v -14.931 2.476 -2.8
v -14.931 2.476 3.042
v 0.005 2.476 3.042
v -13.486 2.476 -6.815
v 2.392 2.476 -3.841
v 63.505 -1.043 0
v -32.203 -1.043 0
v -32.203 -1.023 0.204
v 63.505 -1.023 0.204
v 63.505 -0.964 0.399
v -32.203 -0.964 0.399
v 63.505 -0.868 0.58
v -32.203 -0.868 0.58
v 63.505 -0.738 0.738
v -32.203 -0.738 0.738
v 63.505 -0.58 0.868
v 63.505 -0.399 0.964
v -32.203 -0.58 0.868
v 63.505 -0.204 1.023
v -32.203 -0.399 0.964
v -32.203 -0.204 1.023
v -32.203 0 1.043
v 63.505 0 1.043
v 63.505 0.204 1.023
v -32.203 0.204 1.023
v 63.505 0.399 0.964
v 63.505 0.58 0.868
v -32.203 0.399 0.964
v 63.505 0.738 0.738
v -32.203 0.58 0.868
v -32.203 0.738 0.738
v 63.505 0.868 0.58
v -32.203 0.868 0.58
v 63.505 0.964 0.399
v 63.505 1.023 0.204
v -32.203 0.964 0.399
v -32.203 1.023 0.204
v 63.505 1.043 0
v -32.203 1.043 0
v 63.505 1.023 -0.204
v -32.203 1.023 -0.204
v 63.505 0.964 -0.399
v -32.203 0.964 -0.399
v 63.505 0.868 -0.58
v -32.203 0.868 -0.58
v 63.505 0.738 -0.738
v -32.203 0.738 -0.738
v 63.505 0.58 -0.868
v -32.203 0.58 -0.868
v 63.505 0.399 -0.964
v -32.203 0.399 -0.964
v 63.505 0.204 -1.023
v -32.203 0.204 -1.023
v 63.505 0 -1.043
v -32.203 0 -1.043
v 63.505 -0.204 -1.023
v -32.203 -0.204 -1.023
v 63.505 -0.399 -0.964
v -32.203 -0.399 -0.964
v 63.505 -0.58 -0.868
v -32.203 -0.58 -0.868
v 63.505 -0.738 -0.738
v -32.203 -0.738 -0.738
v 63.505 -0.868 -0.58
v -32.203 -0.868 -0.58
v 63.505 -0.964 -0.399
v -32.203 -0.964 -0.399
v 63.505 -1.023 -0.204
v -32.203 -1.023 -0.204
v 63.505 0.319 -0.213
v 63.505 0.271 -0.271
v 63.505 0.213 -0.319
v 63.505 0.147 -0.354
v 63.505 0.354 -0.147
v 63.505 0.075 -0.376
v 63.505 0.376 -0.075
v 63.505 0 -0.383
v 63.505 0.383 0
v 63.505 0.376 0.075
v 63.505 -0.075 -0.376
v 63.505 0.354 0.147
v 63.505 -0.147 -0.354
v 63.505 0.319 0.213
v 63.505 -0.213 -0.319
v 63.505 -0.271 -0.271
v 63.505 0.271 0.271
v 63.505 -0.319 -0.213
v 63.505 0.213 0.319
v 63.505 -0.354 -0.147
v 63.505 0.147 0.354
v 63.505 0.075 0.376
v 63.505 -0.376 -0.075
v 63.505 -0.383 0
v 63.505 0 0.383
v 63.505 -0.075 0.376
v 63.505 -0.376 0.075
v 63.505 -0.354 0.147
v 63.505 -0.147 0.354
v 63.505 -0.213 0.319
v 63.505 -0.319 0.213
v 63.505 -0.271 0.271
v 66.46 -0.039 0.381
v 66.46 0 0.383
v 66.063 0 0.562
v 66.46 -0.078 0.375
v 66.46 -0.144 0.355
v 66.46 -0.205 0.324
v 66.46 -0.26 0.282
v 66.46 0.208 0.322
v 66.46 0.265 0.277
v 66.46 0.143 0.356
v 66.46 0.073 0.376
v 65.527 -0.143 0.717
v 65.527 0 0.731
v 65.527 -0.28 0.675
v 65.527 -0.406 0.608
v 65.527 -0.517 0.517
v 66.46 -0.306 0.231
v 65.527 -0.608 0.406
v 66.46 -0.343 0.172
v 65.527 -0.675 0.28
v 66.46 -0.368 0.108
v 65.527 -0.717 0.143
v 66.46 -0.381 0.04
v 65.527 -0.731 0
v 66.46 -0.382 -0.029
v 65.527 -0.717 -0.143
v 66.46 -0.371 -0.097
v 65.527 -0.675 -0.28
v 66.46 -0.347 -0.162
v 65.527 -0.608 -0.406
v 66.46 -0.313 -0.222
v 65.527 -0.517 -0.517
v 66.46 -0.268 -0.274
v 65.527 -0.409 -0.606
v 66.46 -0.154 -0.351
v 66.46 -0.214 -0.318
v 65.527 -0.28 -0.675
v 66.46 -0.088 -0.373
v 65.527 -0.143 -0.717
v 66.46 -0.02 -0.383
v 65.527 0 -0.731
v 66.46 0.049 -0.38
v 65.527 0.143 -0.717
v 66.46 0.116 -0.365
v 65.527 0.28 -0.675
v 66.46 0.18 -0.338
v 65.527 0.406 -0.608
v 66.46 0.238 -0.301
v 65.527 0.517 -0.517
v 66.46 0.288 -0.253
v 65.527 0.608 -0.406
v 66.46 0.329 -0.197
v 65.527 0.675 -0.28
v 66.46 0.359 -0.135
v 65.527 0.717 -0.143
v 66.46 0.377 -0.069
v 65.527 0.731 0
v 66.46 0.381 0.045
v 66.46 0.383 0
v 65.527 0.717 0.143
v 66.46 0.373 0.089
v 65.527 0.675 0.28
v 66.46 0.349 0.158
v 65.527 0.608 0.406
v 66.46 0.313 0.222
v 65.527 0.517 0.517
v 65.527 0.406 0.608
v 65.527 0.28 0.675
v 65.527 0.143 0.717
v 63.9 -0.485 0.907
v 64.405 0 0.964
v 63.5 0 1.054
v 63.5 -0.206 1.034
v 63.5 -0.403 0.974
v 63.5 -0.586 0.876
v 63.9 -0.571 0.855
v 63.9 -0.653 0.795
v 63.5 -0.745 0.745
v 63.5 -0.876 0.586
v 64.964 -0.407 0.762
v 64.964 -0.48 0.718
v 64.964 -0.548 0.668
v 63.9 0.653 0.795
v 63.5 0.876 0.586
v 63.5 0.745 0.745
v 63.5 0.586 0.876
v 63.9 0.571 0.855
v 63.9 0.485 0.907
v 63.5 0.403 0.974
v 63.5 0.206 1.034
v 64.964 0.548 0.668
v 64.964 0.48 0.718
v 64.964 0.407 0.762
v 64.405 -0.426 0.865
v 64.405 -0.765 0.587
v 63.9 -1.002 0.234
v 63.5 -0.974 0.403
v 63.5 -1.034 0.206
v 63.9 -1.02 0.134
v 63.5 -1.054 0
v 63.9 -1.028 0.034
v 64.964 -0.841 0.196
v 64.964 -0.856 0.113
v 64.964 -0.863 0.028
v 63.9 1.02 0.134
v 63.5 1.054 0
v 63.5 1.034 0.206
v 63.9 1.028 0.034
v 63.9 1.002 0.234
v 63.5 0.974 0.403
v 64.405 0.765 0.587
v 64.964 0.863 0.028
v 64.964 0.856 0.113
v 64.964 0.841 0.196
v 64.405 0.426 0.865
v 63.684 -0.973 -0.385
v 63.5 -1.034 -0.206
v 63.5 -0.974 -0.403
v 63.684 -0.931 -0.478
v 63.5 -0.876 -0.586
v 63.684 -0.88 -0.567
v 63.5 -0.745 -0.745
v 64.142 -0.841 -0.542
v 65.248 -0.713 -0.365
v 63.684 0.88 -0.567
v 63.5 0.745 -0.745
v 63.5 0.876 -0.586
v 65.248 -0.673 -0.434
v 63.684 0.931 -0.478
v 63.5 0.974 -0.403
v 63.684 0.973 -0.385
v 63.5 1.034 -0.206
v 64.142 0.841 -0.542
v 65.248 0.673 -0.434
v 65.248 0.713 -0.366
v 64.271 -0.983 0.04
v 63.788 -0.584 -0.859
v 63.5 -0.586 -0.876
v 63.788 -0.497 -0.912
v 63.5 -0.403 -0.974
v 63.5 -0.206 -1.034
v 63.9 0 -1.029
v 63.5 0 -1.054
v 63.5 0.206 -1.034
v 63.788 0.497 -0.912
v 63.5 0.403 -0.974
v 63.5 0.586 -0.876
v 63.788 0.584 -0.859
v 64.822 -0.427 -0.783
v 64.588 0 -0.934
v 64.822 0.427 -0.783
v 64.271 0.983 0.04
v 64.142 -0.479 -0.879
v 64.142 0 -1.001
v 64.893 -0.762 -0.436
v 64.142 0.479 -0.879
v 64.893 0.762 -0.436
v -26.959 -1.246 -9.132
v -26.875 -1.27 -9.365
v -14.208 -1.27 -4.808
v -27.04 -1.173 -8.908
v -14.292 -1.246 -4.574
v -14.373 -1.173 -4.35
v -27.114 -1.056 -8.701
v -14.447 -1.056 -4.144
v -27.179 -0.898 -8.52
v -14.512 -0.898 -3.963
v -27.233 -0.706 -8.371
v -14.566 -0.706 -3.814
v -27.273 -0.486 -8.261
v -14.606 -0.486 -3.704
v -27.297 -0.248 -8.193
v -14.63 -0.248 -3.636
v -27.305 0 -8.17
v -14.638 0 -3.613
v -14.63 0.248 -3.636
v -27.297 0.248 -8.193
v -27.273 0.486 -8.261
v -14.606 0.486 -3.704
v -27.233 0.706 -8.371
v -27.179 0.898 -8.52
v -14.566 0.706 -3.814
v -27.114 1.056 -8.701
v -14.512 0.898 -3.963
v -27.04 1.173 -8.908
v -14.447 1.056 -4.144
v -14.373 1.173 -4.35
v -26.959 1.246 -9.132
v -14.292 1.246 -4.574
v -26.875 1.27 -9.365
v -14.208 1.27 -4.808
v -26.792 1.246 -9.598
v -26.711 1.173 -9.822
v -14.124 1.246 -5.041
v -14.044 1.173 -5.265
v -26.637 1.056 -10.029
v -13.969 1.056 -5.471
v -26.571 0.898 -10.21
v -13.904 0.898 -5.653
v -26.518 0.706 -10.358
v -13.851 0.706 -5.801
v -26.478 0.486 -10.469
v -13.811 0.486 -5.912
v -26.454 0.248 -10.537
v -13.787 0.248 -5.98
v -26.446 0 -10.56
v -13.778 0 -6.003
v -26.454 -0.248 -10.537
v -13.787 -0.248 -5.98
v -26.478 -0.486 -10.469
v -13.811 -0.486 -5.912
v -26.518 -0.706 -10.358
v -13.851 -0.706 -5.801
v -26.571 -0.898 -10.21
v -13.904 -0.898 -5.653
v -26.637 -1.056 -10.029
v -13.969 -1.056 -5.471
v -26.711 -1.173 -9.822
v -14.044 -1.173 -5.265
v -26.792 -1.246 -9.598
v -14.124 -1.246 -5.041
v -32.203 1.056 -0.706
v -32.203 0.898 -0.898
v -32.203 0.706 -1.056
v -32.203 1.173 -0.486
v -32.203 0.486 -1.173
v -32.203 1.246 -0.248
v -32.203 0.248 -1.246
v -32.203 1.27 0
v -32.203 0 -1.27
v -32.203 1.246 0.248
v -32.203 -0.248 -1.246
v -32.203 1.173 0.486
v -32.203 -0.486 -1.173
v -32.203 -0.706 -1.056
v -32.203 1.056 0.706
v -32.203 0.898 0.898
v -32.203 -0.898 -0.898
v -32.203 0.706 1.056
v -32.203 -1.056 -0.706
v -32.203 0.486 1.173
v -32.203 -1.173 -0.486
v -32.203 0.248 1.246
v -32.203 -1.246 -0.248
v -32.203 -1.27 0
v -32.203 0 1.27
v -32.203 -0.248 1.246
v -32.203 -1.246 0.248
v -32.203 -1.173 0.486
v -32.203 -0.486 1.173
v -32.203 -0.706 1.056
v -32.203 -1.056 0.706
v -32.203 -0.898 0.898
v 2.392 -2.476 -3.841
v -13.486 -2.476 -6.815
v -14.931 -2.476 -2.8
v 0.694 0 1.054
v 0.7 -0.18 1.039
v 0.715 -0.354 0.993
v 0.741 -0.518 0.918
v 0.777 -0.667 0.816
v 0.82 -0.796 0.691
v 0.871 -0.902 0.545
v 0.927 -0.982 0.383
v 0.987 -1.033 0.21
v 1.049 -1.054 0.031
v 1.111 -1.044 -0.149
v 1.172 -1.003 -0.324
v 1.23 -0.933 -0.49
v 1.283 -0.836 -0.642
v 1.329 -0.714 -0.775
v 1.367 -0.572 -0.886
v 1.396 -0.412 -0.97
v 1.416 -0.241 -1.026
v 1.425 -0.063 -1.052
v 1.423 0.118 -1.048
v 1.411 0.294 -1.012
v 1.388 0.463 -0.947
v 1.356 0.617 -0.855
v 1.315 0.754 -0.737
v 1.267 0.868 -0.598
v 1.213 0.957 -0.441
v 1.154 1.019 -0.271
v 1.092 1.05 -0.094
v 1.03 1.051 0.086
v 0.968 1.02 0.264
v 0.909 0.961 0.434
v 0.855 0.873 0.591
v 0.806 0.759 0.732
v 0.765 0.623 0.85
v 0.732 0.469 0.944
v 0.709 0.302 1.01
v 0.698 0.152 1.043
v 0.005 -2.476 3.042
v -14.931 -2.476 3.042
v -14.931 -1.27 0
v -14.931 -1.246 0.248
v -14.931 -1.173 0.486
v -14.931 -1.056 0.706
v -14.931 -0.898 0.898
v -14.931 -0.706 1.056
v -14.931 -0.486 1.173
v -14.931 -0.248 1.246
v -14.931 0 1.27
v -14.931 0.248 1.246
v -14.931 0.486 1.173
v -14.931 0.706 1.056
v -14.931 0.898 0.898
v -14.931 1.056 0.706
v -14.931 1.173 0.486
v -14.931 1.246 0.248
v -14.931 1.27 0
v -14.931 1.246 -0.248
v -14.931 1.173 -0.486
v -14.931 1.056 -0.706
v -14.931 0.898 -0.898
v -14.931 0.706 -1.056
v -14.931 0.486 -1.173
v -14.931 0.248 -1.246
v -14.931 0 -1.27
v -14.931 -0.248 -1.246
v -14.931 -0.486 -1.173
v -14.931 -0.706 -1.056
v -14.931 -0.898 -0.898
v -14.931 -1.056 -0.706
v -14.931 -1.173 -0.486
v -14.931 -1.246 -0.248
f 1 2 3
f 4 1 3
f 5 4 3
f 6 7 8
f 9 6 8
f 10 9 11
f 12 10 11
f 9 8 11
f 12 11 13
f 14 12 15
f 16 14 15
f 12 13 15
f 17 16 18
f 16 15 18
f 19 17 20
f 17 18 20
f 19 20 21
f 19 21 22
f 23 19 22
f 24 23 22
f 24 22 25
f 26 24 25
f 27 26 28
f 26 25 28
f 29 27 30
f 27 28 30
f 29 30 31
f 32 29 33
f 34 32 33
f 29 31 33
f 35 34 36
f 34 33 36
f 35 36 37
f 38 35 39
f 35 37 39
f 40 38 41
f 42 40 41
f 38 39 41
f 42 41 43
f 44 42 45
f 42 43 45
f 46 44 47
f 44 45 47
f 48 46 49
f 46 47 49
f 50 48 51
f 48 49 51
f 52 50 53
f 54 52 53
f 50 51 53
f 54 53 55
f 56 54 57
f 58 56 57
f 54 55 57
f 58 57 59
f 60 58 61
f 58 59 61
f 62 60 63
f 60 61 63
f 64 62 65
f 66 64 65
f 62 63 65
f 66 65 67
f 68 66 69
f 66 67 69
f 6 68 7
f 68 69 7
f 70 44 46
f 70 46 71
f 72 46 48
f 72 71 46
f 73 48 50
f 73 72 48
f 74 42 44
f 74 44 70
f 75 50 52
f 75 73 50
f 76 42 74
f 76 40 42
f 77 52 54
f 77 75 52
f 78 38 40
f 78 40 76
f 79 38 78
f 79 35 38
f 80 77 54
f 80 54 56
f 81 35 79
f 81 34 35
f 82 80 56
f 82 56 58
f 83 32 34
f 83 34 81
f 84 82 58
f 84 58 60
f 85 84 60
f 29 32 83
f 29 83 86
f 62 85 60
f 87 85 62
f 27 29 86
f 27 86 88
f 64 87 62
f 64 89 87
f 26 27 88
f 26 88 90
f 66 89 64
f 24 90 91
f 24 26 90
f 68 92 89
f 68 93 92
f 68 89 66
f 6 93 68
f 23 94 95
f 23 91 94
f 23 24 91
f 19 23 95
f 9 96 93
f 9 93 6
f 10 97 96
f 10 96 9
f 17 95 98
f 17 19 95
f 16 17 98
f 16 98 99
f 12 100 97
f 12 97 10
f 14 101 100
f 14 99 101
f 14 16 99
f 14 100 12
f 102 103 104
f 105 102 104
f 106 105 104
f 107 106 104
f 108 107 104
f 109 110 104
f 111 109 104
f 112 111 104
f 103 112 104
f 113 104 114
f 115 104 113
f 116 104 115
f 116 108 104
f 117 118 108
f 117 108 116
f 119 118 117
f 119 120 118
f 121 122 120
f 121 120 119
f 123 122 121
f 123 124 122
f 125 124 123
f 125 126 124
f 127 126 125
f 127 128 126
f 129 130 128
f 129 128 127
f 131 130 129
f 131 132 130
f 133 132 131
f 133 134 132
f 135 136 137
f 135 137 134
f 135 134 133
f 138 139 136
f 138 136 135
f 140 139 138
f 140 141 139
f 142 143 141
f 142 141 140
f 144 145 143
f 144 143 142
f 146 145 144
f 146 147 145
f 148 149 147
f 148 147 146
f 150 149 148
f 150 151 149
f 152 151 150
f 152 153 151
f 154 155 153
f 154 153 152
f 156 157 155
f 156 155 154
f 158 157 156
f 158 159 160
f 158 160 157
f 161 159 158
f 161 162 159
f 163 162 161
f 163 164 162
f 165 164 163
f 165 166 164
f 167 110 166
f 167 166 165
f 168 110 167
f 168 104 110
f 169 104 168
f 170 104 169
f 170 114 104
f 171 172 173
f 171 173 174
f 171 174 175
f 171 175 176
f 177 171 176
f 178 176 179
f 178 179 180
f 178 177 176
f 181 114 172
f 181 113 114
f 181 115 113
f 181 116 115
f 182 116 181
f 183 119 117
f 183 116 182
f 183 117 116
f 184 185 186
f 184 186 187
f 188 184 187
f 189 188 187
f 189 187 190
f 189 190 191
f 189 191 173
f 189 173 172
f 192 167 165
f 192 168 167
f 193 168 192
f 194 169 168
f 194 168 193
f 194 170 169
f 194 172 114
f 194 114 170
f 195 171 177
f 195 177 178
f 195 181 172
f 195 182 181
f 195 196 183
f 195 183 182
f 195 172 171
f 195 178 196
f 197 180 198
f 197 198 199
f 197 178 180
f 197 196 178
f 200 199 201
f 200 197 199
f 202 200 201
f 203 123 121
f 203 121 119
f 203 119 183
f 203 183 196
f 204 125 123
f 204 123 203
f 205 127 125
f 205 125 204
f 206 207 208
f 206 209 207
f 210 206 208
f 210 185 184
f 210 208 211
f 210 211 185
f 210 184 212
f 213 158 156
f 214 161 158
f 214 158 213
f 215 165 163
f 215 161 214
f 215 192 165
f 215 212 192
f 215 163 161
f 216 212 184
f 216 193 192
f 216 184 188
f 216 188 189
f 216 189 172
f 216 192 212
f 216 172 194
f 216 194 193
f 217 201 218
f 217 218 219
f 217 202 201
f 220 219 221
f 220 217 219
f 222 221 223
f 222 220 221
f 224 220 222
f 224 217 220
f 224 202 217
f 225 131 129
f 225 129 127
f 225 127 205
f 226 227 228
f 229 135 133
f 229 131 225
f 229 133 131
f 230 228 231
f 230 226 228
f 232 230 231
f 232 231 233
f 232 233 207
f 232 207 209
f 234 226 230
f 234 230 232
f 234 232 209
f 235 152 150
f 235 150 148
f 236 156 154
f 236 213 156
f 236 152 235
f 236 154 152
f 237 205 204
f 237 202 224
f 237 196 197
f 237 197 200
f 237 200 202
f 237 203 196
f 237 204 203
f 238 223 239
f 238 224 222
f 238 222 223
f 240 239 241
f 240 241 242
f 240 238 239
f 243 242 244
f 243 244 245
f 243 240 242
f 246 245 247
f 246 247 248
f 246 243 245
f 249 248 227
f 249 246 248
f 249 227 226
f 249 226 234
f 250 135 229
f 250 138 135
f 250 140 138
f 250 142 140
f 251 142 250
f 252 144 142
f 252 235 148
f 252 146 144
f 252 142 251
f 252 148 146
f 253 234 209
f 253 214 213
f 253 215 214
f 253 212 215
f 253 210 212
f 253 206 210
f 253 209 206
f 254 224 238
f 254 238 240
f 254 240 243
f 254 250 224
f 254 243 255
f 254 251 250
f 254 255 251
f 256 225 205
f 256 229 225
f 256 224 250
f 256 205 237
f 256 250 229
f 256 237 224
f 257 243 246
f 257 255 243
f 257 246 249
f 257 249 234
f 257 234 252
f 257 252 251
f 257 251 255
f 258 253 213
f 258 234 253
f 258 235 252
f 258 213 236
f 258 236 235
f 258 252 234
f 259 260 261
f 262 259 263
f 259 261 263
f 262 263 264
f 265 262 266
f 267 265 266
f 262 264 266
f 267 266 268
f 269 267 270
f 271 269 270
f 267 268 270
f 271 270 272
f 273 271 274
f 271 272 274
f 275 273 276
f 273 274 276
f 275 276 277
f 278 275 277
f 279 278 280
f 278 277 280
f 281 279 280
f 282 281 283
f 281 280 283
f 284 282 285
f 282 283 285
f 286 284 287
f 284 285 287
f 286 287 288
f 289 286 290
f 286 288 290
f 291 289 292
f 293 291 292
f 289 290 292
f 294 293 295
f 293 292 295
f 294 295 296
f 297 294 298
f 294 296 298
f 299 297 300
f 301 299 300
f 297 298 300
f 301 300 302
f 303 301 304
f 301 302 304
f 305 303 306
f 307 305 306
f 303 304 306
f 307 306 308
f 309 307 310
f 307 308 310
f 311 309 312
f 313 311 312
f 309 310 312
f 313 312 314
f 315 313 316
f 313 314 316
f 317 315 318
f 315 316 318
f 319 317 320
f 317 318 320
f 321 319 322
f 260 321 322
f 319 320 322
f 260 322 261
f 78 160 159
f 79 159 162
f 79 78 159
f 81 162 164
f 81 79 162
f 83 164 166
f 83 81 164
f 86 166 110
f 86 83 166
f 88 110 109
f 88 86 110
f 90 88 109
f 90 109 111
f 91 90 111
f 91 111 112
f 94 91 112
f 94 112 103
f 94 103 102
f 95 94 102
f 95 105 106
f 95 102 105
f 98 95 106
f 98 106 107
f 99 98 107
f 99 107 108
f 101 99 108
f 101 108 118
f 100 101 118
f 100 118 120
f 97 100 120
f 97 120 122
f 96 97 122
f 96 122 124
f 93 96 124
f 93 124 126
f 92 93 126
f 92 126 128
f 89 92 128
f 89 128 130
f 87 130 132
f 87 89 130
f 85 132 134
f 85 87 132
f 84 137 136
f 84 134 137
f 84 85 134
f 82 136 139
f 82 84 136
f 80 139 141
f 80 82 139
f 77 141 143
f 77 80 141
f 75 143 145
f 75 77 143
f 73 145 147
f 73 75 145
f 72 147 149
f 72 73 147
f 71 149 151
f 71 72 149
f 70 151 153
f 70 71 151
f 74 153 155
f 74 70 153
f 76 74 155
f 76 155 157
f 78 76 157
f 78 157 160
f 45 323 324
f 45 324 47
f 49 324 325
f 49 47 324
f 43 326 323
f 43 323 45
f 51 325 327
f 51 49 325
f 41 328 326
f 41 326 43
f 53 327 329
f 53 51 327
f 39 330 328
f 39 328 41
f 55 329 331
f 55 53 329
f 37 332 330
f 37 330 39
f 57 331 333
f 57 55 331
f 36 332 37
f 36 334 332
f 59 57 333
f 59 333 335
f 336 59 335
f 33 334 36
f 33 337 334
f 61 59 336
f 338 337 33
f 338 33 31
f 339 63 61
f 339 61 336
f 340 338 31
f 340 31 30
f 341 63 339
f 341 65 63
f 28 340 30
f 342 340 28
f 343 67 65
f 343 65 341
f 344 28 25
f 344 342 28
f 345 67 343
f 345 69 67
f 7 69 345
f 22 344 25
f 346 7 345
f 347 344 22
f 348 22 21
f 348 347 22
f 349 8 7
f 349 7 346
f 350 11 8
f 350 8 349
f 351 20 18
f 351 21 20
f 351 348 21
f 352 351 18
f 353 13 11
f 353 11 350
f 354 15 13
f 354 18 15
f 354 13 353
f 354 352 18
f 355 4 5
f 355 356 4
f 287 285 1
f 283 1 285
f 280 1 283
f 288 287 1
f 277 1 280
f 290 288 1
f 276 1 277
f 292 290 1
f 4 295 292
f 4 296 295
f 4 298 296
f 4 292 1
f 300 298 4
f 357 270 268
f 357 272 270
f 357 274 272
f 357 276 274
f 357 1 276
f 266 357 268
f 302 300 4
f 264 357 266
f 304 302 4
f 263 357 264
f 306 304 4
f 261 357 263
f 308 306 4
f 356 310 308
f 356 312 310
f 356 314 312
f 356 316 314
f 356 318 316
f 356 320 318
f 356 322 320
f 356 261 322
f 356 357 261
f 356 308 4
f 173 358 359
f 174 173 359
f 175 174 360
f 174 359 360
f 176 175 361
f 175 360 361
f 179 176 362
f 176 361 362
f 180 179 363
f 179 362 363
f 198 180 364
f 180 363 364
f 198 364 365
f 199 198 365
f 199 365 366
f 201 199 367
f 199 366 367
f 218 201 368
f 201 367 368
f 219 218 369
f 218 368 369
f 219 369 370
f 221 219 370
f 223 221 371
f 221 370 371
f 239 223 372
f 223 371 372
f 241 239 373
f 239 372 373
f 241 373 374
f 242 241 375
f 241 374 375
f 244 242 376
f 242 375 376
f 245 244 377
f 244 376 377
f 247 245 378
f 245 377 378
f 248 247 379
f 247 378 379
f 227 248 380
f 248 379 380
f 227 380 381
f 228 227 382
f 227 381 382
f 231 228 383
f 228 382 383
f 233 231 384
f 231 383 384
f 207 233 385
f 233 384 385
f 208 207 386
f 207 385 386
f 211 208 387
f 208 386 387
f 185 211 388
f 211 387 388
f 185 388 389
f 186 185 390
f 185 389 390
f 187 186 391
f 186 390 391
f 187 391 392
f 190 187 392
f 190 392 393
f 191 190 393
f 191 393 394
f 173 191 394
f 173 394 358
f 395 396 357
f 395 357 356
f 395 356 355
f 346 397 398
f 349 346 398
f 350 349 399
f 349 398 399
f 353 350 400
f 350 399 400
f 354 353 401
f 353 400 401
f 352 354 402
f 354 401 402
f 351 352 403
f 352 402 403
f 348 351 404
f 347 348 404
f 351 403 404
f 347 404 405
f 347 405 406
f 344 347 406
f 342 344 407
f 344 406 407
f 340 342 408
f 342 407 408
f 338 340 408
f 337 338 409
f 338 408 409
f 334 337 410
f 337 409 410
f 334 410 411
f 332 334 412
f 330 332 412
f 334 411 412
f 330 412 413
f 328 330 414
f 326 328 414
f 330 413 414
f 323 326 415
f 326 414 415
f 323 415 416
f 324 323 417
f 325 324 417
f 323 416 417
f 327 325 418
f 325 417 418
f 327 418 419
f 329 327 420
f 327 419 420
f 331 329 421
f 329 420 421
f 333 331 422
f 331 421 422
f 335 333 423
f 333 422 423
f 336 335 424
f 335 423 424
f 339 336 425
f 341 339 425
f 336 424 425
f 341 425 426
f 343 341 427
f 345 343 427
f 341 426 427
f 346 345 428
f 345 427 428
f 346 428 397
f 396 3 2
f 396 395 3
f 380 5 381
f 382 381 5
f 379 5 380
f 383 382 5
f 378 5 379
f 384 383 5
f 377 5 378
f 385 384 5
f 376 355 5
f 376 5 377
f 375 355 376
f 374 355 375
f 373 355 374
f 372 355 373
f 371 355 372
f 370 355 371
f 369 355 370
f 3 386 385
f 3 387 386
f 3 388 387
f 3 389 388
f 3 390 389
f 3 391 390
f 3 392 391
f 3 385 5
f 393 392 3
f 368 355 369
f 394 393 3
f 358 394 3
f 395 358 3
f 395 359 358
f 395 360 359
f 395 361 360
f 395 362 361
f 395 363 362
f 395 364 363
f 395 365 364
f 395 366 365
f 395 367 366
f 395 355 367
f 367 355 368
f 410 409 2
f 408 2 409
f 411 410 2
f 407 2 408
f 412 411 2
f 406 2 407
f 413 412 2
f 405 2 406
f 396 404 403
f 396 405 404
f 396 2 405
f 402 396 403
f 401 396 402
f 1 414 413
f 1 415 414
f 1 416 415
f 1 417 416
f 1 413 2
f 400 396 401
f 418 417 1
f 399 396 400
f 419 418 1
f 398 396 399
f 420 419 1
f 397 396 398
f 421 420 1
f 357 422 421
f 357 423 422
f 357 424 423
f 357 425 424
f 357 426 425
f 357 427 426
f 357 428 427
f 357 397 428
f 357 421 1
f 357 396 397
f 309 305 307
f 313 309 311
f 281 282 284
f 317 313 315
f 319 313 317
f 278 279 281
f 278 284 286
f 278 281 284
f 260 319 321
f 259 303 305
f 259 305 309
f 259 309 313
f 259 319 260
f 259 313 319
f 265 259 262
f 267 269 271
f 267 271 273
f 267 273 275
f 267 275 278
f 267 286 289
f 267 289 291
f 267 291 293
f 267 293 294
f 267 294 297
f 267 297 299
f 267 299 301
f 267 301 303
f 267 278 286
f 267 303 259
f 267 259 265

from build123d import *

# Parameters (mm, degrees)
F3_DEPTH       = 2.4765
F4_R           = 1.27
F5_DEPTH       = 17.272
F6_R           = 1.27
F7_DEPTH       = 13.462
F8_R           = 1.0434793425
F9_DEPTH       = 95.7072
F9_DEPTH_BACK  = 132
F10_R          = 0.3833262894
F11_DEPTH      = 32.2036075046
F11_DEPTH_BACK = 66.8030001


# Not quite as in the source:
# - an extrude ends at something that could not be found from the text; its depth is read off the source's solid


with BuildPart() as f1:
    # F0 (on Front) → F1 (revolve)
    with BuildSketch(Plane.XZ):
        with BuildLine():
            Line((63.5, 1.0541), (0, 1.0541))
            Line((0, 1.0541), (0, 0))
            Line((0, 0), (66.802, 0))
            add(Edge.make_bspline(
                [(63.5, 1.0541), (64.35611099, 1.0419137543), (66.7864059348, 0.5992812803), (66.802, 0)],
                knots=[0, 0, 0, 0, 3.4661694722, 3.4661694722, 3.4661694722, 3.4661694722], degree=3))
        make_face()
    revolve(axis=Axis((33.401, 0, 0), (1, 0, 0)))

    # F2 (on Front) → F3 (join, symmetric)
    with BuildSketch(Plane.XZ):
        Polygon((0.0045924954, 3.0420540417), (-14.9306075046, 3.0420540417), (-14.9306075046, -2.7999459583), (-13.4860288486, -6.8151904523), (2.3921924954, -3.8408457662), align=None)
    extrude(amount=F3_DEPTH, both=True)

    # F4 (on face) → F5 (join)
    with BuildSketch(Plane(origin=(-14.9306075046, 0, 0), x_dir=(0, -1, 0), z_dir=(-1, 0, 0))):
        Circle(F4_R)
    extrude(amount=F5_DEPTH)

    # F6 (on face) → F7 (join)
    with BuildSketch(Plane(origin=(-14.1114148908, 0, -5.0769134453), x_dir=(0, -1, 0), z_dir=(-0.9409553089, 0, -0.3385308062))):
        with Locations((0, 0.2862465809)):
            Circle(F6_R)
    extrude(amount=F7_DEPTH)

    # F8 (on face) → F9 (cut, two sides)
    with BuildSketch(Plane(origin=(-32.2026075046, 0, 0), x_dir=(0, -1, 0), z_dir=(-1, 0, 0))) as f9_sk:
        Circle(F8_R)
    extrude(amount=-F9_DEPTH, mode=Mode.SUBTRACT)
    extrude(f9_sk.sketch, amount=F9_DEPTH_BACK, mode=Mode.SUBTRACT)

    # F10 (on Right) → F11 (cut, two sides)
    with BuildSketch(Plane.YZ) as f11_sk:
        Circle(F10_R)
    extrude(amount=-F11_DEPTH, mode=Mode.SUBTRACT)
    extrude(f11_sk.sketch, amount=F11_DEPTH_BACK, mode=Mode.SUBTRACT)


solid = f1.part
